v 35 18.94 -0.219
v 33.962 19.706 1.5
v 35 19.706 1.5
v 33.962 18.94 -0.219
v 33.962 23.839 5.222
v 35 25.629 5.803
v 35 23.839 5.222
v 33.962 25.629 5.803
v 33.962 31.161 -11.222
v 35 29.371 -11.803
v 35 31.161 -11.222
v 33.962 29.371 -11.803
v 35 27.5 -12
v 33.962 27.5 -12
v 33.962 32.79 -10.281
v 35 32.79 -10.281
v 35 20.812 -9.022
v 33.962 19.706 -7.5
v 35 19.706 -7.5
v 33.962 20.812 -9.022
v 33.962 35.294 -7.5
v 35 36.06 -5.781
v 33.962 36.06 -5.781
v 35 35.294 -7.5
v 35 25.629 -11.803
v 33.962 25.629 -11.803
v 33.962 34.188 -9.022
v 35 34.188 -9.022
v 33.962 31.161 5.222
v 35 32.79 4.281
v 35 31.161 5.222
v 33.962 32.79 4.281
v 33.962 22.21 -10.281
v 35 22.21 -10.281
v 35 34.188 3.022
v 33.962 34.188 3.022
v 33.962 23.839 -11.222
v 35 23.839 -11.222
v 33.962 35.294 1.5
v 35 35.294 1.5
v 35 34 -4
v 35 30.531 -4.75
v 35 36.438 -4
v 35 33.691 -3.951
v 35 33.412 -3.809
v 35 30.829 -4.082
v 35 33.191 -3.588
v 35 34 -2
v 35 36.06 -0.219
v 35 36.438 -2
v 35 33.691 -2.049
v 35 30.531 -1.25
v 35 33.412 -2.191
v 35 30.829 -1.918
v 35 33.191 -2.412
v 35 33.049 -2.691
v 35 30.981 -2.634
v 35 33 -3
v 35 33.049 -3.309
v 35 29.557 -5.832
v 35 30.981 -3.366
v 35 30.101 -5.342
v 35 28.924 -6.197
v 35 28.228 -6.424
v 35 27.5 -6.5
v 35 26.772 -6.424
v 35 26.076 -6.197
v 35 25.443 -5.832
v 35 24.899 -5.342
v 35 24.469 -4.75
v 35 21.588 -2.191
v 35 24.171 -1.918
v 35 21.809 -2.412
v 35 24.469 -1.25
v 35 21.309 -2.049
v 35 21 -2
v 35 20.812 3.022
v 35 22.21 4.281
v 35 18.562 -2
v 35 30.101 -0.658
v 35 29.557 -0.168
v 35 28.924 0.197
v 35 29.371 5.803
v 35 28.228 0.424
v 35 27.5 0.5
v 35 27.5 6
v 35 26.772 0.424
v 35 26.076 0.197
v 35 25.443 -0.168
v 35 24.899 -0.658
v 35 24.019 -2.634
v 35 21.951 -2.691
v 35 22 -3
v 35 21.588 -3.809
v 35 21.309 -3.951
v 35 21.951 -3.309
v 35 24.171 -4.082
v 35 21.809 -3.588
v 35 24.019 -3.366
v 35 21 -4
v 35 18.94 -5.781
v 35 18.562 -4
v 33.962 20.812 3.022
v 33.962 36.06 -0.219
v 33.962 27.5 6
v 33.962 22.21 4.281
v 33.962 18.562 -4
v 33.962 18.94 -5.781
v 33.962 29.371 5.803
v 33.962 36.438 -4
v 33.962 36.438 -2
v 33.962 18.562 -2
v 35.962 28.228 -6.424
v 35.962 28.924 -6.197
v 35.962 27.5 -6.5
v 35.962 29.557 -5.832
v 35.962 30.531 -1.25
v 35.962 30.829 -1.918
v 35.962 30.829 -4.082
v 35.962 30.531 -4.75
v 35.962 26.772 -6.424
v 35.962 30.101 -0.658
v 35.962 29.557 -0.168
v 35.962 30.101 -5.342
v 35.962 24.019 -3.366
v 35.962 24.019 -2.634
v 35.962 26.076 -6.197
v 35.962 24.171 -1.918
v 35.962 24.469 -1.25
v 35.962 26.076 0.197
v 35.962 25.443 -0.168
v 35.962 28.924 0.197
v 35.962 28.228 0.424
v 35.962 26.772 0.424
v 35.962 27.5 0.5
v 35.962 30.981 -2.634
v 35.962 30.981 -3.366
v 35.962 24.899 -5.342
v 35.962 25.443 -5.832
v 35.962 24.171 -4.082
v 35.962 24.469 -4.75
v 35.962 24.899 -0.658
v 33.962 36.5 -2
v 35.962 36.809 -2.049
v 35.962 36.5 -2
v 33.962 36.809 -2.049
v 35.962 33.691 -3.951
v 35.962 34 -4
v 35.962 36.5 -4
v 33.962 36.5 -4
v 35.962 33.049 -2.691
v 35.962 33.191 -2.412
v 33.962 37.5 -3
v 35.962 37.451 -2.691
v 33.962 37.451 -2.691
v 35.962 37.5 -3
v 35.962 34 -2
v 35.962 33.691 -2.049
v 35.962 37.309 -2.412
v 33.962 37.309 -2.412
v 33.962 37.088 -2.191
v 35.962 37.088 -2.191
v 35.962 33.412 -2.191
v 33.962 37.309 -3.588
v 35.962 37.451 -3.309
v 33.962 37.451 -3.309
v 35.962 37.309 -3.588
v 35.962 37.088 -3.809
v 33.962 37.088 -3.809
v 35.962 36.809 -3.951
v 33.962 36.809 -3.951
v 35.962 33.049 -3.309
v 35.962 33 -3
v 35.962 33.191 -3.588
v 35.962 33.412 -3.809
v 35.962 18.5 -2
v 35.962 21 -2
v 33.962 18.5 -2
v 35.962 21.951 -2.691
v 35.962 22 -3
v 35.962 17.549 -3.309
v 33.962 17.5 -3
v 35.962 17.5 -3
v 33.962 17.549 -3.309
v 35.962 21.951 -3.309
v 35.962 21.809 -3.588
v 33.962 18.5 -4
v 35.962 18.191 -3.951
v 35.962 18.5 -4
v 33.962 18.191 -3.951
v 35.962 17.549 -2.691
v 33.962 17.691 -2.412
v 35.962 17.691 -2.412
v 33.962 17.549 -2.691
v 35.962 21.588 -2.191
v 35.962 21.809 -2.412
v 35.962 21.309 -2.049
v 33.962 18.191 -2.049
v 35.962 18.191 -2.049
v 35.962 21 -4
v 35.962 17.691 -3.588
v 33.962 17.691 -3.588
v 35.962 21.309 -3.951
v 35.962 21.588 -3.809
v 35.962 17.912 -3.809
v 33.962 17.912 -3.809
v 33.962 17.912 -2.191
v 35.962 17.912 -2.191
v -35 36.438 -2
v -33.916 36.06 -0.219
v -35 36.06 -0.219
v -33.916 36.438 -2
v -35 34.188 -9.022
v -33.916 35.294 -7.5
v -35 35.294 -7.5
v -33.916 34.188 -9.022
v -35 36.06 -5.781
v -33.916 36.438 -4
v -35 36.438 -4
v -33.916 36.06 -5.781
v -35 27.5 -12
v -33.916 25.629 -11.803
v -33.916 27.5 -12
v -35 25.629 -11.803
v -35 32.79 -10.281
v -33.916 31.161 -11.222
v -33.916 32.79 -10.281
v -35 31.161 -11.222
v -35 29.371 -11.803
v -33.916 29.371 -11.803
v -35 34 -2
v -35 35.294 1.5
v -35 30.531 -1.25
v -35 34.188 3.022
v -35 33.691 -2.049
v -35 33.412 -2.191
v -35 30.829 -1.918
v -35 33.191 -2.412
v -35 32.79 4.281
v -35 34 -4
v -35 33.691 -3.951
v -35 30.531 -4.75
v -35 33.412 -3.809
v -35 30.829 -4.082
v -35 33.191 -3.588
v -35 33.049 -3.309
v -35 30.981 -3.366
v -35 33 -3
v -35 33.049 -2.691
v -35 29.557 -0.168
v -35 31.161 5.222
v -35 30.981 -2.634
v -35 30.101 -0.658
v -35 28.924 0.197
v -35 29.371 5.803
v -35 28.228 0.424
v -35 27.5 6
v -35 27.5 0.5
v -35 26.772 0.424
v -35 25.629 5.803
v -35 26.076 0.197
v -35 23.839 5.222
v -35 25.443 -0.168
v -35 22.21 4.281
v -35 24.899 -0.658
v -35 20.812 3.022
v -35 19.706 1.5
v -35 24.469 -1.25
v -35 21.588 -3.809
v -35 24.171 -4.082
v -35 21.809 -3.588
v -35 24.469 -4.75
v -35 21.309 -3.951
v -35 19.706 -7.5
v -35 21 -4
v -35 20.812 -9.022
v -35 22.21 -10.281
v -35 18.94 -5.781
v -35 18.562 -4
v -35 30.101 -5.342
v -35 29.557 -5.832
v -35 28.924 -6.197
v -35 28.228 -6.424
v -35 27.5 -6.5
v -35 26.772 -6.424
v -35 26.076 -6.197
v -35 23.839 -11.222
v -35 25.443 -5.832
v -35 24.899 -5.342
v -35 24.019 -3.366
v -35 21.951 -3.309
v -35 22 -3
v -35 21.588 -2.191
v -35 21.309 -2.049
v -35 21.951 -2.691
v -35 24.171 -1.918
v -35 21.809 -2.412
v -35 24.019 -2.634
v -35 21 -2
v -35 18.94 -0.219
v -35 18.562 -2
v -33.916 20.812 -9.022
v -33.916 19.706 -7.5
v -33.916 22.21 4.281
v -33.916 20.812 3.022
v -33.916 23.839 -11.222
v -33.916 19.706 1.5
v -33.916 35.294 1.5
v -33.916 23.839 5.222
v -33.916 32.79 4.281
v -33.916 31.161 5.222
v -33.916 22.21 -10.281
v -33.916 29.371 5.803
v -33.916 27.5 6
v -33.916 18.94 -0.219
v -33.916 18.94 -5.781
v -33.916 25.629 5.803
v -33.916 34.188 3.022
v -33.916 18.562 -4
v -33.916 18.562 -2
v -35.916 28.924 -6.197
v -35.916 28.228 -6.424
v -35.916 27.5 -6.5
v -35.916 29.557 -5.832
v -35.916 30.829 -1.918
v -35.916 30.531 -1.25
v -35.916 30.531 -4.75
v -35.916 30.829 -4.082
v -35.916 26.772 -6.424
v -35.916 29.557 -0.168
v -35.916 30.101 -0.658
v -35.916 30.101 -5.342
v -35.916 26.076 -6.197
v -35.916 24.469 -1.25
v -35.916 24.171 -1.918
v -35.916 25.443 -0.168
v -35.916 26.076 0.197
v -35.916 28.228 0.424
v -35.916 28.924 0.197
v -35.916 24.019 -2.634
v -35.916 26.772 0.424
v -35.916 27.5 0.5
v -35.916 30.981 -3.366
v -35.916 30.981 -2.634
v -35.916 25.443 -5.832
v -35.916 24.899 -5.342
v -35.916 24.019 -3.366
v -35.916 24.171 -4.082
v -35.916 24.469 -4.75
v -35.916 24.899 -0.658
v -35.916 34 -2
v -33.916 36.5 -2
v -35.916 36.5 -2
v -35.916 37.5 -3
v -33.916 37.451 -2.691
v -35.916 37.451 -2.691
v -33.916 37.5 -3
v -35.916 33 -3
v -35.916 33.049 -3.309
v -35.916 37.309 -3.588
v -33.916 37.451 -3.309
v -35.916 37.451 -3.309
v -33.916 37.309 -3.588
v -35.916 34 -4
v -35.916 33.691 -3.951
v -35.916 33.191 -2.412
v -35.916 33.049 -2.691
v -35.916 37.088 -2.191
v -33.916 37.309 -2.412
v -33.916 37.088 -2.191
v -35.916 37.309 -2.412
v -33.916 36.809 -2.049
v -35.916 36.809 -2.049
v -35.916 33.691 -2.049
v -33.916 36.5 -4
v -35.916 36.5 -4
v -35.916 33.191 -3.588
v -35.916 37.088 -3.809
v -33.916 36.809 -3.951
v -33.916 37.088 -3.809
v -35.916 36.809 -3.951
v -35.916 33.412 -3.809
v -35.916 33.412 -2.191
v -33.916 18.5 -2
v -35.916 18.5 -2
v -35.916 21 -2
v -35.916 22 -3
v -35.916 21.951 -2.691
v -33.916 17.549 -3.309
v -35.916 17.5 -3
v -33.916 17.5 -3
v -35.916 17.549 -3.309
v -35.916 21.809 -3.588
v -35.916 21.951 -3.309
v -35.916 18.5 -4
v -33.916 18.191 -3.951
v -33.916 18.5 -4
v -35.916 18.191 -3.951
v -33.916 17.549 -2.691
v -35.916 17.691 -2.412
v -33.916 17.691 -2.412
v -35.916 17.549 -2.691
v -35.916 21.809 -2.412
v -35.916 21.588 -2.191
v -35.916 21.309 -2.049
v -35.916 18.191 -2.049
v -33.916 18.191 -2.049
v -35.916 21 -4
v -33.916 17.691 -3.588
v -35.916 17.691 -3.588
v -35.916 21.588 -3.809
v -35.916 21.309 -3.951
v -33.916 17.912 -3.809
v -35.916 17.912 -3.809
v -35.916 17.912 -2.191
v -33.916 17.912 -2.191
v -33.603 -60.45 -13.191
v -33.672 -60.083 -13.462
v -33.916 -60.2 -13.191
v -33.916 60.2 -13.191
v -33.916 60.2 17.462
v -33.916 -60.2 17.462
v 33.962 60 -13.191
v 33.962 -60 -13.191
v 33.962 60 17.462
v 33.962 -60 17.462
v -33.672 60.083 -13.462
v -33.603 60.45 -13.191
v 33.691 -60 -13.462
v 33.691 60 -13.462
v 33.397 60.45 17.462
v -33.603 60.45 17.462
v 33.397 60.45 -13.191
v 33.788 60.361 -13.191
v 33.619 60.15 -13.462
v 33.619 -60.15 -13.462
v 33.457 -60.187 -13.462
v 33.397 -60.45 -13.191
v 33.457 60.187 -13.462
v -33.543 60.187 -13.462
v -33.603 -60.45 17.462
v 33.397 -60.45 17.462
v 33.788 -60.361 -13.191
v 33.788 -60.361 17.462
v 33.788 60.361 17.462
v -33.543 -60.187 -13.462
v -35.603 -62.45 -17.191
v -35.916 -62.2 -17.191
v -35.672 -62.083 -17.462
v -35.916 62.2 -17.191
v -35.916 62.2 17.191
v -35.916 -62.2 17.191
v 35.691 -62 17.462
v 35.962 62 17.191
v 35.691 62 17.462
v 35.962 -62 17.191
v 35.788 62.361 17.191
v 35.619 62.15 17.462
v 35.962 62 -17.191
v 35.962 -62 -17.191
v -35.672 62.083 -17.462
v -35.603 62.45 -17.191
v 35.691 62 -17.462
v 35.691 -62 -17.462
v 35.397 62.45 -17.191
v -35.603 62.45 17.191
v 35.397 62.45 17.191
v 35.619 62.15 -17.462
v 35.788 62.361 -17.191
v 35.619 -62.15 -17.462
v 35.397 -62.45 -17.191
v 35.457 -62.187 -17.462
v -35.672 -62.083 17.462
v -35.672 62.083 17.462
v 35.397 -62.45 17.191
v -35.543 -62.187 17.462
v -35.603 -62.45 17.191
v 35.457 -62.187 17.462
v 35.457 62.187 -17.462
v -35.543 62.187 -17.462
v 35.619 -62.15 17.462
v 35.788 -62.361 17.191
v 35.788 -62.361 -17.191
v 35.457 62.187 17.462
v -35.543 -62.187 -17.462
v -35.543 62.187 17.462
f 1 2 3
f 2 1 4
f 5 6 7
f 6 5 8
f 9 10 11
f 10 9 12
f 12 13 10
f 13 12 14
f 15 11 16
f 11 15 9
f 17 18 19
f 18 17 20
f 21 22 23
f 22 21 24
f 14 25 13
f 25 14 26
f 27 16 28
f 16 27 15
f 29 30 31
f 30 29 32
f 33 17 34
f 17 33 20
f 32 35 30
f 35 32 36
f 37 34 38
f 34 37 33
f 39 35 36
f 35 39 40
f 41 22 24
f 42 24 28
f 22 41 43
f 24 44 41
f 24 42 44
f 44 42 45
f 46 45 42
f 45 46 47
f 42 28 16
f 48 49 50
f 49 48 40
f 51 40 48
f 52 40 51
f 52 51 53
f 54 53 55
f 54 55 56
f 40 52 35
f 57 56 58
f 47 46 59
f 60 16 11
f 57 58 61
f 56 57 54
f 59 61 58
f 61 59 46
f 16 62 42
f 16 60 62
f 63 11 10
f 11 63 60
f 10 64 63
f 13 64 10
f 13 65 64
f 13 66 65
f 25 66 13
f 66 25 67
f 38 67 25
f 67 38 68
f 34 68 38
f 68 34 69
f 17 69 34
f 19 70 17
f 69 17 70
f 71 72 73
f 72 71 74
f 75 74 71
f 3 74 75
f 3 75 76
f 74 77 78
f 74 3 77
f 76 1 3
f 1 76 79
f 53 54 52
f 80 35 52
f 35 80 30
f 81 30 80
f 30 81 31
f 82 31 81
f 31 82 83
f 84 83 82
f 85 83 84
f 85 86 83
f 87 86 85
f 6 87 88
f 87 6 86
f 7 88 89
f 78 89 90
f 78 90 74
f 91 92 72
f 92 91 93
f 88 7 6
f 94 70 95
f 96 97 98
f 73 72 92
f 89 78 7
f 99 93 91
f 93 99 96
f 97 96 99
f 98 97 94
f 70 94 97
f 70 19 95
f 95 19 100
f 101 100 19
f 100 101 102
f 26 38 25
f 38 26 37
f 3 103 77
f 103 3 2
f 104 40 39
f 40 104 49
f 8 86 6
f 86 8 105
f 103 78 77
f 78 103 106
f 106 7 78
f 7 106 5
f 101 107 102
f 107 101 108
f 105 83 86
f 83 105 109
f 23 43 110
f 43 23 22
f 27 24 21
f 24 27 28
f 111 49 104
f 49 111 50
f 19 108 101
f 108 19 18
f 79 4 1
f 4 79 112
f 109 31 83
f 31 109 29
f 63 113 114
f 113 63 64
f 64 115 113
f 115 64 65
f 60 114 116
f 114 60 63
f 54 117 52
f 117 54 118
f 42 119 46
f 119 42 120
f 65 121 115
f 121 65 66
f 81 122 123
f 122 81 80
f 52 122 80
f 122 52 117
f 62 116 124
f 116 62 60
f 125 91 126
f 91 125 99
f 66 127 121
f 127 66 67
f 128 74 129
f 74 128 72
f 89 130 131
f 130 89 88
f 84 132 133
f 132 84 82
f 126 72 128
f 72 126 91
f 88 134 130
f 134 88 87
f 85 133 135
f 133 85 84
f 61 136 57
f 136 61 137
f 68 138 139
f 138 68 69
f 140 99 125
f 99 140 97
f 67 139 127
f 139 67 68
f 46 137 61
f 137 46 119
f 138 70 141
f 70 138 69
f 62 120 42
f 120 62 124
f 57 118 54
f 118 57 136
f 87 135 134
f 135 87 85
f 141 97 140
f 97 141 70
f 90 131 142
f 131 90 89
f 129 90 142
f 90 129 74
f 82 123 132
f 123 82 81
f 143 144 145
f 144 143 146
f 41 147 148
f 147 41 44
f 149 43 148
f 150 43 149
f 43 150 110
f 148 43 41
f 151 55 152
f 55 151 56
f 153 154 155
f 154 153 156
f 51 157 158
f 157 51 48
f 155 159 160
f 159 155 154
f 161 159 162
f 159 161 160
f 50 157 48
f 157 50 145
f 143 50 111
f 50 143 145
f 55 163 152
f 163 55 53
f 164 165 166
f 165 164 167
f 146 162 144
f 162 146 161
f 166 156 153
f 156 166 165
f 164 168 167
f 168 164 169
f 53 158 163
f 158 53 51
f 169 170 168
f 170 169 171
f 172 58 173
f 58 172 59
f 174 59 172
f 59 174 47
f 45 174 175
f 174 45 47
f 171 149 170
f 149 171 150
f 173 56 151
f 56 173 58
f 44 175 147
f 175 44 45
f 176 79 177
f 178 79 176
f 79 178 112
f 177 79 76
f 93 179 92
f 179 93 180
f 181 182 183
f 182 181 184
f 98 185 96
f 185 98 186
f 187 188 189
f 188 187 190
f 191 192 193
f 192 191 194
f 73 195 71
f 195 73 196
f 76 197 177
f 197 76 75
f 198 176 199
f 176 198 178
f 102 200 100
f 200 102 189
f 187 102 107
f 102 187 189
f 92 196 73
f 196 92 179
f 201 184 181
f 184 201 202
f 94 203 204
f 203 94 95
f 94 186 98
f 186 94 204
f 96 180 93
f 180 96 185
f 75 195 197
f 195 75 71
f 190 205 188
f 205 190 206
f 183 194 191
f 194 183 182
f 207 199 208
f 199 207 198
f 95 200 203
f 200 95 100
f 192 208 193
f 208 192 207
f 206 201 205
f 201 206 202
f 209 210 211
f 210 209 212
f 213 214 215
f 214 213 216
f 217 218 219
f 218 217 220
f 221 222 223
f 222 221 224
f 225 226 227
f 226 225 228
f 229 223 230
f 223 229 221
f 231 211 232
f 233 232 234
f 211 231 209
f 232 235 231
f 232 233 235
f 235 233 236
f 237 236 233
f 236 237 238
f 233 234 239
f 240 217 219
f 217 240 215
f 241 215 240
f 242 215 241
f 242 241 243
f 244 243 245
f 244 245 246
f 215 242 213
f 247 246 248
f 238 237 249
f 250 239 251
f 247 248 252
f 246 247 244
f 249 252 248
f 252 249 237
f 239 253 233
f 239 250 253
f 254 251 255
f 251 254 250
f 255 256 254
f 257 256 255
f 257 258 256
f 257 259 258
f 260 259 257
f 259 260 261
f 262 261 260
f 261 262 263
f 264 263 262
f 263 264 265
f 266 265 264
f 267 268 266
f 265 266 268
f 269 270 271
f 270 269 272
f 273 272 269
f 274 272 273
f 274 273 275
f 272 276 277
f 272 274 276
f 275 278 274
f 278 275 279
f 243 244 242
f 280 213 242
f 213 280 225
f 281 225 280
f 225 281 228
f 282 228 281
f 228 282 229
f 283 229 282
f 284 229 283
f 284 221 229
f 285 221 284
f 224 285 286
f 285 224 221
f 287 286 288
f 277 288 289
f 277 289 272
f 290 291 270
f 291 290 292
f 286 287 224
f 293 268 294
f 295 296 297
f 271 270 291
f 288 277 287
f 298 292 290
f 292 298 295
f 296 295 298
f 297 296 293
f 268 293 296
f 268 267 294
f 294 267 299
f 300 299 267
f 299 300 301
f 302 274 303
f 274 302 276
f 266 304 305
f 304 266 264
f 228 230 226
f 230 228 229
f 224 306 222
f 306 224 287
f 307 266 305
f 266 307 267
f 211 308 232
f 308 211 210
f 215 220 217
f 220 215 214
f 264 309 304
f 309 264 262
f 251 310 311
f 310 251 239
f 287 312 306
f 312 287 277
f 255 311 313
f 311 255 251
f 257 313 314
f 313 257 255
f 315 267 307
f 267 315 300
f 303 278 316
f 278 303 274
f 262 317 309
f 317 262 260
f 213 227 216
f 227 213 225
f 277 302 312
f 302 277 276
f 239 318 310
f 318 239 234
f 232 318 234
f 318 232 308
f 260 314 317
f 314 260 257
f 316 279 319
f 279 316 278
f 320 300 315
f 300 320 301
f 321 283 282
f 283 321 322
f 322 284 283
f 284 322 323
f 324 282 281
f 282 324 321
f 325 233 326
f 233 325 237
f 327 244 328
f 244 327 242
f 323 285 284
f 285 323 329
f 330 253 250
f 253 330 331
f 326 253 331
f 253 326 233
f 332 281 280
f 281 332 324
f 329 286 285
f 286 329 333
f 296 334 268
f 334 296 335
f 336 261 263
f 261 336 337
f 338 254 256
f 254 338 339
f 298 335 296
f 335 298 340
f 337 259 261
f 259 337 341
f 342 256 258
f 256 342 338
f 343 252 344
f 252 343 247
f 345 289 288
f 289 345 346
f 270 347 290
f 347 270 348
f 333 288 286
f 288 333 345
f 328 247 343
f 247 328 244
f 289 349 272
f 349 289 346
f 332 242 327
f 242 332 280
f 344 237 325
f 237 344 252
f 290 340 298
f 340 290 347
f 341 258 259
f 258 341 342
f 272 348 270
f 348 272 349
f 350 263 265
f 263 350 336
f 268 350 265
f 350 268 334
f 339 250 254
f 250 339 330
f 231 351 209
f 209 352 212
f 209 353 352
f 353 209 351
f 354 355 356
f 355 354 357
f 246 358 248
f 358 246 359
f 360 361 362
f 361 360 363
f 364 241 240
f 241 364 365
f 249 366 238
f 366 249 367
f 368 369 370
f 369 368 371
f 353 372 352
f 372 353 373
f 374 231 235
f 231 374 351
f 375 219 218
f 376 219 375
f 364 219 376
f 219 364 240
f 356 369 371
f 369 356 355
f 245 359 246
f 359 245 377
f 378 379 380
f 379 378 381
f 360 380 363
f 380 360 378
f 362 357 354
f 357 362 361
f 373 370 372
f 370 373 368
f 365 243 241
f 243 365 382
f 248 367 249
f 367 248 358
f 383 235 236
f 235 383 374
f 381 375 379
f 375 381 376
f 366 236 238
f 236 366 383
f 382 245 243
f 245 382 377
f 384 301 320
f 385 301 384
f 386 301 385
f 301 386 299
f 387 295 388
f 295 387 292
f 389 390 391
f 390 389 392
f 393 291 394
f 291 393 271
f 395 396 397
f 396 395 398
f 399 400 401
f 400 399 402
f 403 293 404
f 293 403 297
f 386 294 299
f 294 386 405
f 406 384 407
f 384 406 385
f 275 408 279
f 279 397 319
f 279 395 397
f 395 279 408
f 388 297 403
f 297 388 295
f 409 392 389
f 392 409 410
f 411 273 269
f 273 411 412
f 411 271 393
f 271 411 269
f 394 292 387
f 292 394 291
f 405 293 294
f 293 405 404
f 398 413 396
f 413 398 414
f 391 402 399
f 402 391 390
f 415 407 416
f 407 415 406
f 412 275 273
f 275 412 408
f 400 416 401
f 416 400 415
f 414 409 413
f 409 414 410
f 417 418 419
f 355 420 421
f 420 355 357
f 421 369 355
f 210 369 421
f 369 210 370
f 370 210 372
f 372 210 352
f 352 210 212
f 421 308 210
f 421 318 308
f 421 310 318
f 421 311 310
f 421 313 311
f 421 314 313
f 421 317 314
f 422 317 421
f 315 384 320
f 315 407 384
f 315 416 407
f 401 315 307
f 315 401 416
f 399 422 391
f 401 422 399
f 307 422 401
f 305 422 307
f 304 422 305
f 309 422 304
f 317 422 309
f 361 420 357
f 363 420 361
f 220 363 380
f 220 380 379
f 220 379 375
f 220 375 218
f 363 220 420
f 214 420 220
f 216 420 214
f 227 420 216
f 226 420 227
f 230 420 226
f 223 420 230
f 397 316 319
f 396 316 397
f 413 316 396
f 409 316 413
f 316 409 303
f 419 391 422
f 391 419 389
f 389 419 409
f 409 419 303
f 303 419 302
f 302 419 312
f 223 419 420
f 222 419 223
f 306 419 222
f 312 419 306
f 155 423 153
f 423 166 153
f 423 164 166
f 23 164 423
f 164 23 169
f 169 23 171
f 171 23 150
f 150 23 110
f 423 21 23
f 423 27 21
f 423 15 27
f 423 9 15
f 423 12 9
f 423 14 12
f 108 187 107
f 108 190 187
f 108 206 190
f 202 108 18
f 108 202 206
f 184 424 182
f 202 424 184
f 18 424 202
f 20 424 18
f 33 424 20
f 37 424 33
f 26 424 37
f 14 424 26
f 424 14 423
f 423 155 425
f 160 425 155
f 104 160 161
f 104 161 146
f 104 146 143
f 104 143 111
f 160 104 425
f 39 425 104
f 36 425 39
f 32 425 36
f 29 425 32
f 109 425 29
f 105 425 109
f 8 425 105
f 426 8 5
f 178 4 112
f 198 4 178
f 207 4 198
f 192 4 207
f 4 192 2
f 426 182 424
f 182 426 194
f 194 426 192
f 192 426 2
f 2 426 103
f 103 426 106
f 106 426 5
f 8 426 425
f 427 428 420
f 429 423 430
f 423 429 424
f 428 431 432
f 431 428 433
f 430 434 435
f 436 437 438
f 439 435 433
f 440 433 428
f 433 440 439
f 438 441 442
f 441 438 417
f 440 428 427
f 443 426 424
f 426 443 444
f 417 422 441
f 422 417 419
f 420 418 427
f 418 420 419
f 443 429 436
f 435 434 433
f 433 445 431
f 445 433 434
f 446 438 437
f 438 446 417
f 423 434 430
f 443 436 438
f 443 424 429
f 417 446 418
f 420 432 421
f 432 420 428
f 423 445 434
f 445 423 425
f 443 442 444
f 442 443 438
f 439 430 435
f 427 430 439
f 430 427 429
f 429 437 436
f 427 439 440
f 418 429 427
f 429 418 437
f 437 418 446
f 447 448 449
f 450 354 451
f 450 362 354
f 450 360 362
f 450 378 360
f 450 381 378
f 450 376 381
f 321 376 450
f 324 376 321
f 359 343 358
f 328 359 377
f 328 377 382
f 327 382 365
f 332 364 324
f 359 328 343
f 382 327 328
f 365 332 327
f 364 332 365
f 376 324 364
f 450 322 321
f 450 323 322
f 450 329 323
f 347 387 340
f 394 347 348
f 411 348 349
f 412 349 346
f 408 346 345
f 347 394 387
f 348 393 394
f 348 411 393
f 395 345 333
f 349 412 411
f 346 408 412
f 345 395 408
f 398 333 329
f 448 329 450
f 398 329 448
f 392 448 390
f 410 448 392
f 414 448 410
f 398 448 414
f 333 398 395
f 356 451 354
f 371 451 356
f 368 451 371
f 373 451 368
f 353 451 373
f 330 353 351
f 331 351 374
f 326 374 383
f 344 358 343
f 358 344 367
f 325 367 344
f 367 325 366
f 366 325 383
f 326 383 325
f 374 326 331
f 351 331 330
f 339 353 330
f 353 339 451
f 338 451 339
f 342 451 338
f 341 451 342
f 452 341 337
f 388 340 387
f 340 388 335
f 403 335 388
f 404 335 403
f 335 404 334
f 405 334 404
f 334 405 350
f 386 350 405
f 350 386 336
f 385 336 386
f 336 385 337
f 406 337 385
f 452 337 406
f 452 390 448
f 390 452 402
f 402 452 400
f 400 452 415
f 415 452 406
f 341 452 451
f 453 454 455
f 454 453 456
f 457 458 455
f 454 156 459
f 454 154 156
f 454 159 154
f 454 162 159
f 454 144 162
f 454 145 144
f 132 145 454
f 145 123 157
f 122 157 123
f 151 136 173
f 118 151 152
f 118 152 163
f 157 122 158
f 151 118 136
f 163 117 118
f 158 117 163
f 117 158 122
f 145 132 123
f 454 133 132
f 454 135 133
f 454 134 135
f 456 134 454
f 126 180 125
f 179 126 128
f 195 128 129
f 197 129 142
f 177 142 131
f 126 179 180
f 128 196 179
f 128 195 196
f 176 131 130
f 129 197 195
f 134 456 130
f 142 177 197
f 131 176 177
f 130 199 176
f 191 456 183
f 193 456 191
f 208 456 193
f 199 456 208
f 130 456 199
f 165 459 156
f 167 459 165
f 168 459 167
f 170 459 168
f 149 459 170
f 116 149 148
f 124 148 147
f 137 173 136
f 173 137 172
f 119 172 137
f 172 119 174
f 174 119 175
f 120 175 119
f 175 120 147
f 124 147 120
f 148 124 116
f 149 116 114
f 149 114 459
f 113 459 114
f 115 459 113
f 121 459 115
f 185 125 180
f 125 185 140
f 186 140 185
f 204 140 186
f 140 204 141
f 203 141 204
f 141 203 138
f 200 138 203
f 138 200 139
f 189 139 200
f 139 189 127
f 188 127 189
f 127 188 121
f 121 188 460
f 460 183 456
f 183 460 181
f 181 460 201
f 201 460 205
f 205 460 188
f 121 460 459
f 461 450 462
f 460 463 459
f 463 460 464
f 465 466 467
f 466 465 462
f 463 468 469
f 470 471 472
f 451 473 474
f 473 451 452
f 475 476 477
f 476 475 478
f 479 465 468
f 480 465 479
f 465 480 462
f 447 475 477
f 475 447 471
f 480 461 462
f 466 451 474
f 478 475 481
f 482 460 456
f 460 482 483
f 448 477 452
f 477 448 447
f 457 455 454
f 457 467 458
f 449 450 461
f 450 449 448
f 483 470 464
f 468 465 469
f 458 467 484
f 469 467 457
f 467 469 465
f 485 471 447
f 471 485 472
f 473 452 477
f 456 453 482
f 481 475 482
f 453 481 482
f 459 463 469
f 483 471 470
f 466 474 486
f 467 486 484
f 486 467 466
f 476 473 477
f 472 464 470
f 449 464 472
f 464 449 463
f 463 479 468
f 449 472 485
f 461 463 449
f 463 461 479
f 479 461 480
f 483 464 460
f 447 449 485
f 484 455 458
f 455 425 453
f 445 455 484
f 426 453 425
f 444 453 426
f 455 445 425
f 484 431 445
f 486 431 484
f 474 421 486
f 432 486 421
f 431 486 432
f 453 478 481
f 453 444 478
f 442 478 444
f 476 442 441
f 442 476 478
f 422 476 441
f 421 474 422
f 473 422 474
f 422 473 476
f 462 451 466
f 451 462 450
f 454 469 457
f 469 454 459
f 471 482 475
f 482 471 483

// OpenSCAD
// file: roundedcube.scad
// Higher definition curves
$fs = 0.5;

module roundedcube(size = [1, 1, 1], center = false, radius = 0.5, apply_to = "all") {
	// If single value, convert to [x, y, z] vector
	size = (size[0] == undef) ? [size, size, size] : size;

	translate_min = radius;
	translate_xmax = size[0] - radius;
	translate_ymax = size[1] - radius;
	translate_zmax = size[2] - radius;

	diameter = radius * 2;

	module build_point(type = "sphere", rotate = [0, 0, 0]) {
		if (type == "sphere") {
			sphere(r = radius);
		} else if (type == "cylinder") {
			rotate(a = rotate)
			cylinder(h = diameter, r = radius, center = true);
		}
	}

	obj_translate = (center == false) ?
		[0, 0, 0] : [
			-(size[0] / 2),
			-(size[1] / 2),
			-(size[2] / 2)
		];

	translate(v = obj_translate) {
		hull() {
			for (translate_x = [translate_min, translate_xmax]) {
				x_at = (translate_x == translate_min) ? "min" : "max";
				for (translate_y = [translate_min, translate_ymax]) {
					y_at = (translate_y == translate_min) ? "min" : "max";
					for (translate_z = [translate_min, translate_zmax]) {
						z_at = (translate_z == translate_min) ? "min" : "max";

						translate(v = [translate_x, translate_y, translate_z])
						if (
							(apply_to == "all") ||
							(apply_to == "xmin" && x_at == "min") || (apply_to == "xmax" && x_at == "max") ||
							(apply_to == "ymin" && y_at == "min") || (apply_to == "ymax" && y_at == "max") ||
							(apply_to == "zmin" && z_at == "min") || (apply_to == "zmax" && z_at == "max")
						) {
							build_point("sphere");
						} else {
							rotate = 
								(apply_to == "xmin" || apply_to == "xmax" || apply_to == "x") ? [0, 90, 0] : (
								(apply_to == "ymin" || apply_to == "ymax" || apply_to == "y") ? [90, 90, 0] :
								[0, 0, 0]
							);
							build_point("cylinder", rotate);
						}
					}
				}
			}
		}
	}
}
// main file
include<roundedcube.scad>
//conficguration
WIDTH = 72;
DEPTH = 125;
HEIGHT = 35;
SHELL_SIZE = 4;

BODY_SIZE = [WIDTH, DEPTH, HEIGHT];
BODY_SHELL = [WIDTH-SHELL_SIZE,DEPTH-SHELL_SIZE,HEIGHT];

SERVO_HEAD_WIDTH = 13;
SERVO_HEAD_DPETH = 10;
SERVO_HEAD_HEIGHT = 14;
SERVO_HEAD = [SERVO_HEAD_WIDTH,SERVO_HEAD_DPETH,SERVO_HEAD_HEIGHT];
SERVO_HANDLE = 5;
SERVO_PREFIX_DEPTH = 30;

WHEEL_HOLE_PREFIX=10;

MOTOR_OUTER_DIA = 18;
MOTOR_INNER_DIA = 7;

module screw_hole() {
    $fn=20;
    SCREW_DIA=2;
    rotate([90,0,90]) {
        hull() {
        cylinder(h=10,d=SCREW_DIA,center=true);
        translate([SERVO_HANDLE/2,0,0]) {
            cylinder(h=10,d=SCREW_DIA,center=true);
            }       
        }
    }
}

module wheel_hole(WHEEL_DIA=6) {
    $fn=20;
    WHEEL_DIA_HOLE=WHEEL_DIA+1;
    HOLE_DIA=5;
    LENGTH_DOWN=5;
    rotate([0,90,0]) {
        cylinder(h=5,d=WHEEL_DIA_HOLE,center=true);
        hull() {
        cylinder(h=5,d=HOLE_DIA,center=true);
        translate([LENGTH_DOWN,0,0]) {
            cylinder(h=5,d=HOLE_DIA,center=true);
            }       
        }
    }
}

module body() {
    difference(){
        roundedcube(BODY_SIZE, center=true);
        translate([0,0,SHELL_SIZE]) {
            roundedcube(BODY_SHELL, center=true);
            //LEFT
            translate([(WIDTH/2),
            (DEPTH/2)-SERVO_HANDLE-SERVO_PREFIX_DEPTH,
            -(HEIGHT/2.5)+(SERVO_HEAD_HEIGHT/2)]) {
                rotate([0, 90, 0]) {
                    translate([0,0,-2]) {
                        cylinder(h=2, d=MOTOR_OUTER_DIA, center=true);
                        
                    }
                    cylinder(h=5, d=MOTOR_INNER_DIA, center=true);
                }
                translate([0,SERVO_HEAD_DPETH/2+(SERVO_HANDLE/2)-1,0 ]) {
                    screw_hole();
                }
                translate([0,-SERVO_HEAD_DPETH/2-(SERVO_HANDLE)+1,0 ]) {
                    screw_hole();
                }
            }
            //RIGHT
            translate([-(WIDTH/2),
            (DEPTH/2)-SERVO_HANDLE-SERVO_PREFIX_DEPTH,
            -(HEIGHT/2.5)+(SERVO_HEAD_HEIGHT/2)]) {
                rotate([0, 90, 0]) {
                    translate([0,0,2]) {
                        cylinder(h=2, d=MOTOR_OUTER_DIA, center=true);
                        
                     }
                    cylinder(h=3, d=MOTOR_INNER_DIA, center=true);
                }
                translate([0,SERVO_HEAD_DPETH/2+(SERVO_HANDLE/2)-1,0 ]) {
                    screw_hole();
                }
                translate([0,-SERVO_HEAD_DPETH/2-(SERVO_HANDLE)+1,0 ]) {
                    screw_hole();
                }
            }
        }
    }
}
body();
